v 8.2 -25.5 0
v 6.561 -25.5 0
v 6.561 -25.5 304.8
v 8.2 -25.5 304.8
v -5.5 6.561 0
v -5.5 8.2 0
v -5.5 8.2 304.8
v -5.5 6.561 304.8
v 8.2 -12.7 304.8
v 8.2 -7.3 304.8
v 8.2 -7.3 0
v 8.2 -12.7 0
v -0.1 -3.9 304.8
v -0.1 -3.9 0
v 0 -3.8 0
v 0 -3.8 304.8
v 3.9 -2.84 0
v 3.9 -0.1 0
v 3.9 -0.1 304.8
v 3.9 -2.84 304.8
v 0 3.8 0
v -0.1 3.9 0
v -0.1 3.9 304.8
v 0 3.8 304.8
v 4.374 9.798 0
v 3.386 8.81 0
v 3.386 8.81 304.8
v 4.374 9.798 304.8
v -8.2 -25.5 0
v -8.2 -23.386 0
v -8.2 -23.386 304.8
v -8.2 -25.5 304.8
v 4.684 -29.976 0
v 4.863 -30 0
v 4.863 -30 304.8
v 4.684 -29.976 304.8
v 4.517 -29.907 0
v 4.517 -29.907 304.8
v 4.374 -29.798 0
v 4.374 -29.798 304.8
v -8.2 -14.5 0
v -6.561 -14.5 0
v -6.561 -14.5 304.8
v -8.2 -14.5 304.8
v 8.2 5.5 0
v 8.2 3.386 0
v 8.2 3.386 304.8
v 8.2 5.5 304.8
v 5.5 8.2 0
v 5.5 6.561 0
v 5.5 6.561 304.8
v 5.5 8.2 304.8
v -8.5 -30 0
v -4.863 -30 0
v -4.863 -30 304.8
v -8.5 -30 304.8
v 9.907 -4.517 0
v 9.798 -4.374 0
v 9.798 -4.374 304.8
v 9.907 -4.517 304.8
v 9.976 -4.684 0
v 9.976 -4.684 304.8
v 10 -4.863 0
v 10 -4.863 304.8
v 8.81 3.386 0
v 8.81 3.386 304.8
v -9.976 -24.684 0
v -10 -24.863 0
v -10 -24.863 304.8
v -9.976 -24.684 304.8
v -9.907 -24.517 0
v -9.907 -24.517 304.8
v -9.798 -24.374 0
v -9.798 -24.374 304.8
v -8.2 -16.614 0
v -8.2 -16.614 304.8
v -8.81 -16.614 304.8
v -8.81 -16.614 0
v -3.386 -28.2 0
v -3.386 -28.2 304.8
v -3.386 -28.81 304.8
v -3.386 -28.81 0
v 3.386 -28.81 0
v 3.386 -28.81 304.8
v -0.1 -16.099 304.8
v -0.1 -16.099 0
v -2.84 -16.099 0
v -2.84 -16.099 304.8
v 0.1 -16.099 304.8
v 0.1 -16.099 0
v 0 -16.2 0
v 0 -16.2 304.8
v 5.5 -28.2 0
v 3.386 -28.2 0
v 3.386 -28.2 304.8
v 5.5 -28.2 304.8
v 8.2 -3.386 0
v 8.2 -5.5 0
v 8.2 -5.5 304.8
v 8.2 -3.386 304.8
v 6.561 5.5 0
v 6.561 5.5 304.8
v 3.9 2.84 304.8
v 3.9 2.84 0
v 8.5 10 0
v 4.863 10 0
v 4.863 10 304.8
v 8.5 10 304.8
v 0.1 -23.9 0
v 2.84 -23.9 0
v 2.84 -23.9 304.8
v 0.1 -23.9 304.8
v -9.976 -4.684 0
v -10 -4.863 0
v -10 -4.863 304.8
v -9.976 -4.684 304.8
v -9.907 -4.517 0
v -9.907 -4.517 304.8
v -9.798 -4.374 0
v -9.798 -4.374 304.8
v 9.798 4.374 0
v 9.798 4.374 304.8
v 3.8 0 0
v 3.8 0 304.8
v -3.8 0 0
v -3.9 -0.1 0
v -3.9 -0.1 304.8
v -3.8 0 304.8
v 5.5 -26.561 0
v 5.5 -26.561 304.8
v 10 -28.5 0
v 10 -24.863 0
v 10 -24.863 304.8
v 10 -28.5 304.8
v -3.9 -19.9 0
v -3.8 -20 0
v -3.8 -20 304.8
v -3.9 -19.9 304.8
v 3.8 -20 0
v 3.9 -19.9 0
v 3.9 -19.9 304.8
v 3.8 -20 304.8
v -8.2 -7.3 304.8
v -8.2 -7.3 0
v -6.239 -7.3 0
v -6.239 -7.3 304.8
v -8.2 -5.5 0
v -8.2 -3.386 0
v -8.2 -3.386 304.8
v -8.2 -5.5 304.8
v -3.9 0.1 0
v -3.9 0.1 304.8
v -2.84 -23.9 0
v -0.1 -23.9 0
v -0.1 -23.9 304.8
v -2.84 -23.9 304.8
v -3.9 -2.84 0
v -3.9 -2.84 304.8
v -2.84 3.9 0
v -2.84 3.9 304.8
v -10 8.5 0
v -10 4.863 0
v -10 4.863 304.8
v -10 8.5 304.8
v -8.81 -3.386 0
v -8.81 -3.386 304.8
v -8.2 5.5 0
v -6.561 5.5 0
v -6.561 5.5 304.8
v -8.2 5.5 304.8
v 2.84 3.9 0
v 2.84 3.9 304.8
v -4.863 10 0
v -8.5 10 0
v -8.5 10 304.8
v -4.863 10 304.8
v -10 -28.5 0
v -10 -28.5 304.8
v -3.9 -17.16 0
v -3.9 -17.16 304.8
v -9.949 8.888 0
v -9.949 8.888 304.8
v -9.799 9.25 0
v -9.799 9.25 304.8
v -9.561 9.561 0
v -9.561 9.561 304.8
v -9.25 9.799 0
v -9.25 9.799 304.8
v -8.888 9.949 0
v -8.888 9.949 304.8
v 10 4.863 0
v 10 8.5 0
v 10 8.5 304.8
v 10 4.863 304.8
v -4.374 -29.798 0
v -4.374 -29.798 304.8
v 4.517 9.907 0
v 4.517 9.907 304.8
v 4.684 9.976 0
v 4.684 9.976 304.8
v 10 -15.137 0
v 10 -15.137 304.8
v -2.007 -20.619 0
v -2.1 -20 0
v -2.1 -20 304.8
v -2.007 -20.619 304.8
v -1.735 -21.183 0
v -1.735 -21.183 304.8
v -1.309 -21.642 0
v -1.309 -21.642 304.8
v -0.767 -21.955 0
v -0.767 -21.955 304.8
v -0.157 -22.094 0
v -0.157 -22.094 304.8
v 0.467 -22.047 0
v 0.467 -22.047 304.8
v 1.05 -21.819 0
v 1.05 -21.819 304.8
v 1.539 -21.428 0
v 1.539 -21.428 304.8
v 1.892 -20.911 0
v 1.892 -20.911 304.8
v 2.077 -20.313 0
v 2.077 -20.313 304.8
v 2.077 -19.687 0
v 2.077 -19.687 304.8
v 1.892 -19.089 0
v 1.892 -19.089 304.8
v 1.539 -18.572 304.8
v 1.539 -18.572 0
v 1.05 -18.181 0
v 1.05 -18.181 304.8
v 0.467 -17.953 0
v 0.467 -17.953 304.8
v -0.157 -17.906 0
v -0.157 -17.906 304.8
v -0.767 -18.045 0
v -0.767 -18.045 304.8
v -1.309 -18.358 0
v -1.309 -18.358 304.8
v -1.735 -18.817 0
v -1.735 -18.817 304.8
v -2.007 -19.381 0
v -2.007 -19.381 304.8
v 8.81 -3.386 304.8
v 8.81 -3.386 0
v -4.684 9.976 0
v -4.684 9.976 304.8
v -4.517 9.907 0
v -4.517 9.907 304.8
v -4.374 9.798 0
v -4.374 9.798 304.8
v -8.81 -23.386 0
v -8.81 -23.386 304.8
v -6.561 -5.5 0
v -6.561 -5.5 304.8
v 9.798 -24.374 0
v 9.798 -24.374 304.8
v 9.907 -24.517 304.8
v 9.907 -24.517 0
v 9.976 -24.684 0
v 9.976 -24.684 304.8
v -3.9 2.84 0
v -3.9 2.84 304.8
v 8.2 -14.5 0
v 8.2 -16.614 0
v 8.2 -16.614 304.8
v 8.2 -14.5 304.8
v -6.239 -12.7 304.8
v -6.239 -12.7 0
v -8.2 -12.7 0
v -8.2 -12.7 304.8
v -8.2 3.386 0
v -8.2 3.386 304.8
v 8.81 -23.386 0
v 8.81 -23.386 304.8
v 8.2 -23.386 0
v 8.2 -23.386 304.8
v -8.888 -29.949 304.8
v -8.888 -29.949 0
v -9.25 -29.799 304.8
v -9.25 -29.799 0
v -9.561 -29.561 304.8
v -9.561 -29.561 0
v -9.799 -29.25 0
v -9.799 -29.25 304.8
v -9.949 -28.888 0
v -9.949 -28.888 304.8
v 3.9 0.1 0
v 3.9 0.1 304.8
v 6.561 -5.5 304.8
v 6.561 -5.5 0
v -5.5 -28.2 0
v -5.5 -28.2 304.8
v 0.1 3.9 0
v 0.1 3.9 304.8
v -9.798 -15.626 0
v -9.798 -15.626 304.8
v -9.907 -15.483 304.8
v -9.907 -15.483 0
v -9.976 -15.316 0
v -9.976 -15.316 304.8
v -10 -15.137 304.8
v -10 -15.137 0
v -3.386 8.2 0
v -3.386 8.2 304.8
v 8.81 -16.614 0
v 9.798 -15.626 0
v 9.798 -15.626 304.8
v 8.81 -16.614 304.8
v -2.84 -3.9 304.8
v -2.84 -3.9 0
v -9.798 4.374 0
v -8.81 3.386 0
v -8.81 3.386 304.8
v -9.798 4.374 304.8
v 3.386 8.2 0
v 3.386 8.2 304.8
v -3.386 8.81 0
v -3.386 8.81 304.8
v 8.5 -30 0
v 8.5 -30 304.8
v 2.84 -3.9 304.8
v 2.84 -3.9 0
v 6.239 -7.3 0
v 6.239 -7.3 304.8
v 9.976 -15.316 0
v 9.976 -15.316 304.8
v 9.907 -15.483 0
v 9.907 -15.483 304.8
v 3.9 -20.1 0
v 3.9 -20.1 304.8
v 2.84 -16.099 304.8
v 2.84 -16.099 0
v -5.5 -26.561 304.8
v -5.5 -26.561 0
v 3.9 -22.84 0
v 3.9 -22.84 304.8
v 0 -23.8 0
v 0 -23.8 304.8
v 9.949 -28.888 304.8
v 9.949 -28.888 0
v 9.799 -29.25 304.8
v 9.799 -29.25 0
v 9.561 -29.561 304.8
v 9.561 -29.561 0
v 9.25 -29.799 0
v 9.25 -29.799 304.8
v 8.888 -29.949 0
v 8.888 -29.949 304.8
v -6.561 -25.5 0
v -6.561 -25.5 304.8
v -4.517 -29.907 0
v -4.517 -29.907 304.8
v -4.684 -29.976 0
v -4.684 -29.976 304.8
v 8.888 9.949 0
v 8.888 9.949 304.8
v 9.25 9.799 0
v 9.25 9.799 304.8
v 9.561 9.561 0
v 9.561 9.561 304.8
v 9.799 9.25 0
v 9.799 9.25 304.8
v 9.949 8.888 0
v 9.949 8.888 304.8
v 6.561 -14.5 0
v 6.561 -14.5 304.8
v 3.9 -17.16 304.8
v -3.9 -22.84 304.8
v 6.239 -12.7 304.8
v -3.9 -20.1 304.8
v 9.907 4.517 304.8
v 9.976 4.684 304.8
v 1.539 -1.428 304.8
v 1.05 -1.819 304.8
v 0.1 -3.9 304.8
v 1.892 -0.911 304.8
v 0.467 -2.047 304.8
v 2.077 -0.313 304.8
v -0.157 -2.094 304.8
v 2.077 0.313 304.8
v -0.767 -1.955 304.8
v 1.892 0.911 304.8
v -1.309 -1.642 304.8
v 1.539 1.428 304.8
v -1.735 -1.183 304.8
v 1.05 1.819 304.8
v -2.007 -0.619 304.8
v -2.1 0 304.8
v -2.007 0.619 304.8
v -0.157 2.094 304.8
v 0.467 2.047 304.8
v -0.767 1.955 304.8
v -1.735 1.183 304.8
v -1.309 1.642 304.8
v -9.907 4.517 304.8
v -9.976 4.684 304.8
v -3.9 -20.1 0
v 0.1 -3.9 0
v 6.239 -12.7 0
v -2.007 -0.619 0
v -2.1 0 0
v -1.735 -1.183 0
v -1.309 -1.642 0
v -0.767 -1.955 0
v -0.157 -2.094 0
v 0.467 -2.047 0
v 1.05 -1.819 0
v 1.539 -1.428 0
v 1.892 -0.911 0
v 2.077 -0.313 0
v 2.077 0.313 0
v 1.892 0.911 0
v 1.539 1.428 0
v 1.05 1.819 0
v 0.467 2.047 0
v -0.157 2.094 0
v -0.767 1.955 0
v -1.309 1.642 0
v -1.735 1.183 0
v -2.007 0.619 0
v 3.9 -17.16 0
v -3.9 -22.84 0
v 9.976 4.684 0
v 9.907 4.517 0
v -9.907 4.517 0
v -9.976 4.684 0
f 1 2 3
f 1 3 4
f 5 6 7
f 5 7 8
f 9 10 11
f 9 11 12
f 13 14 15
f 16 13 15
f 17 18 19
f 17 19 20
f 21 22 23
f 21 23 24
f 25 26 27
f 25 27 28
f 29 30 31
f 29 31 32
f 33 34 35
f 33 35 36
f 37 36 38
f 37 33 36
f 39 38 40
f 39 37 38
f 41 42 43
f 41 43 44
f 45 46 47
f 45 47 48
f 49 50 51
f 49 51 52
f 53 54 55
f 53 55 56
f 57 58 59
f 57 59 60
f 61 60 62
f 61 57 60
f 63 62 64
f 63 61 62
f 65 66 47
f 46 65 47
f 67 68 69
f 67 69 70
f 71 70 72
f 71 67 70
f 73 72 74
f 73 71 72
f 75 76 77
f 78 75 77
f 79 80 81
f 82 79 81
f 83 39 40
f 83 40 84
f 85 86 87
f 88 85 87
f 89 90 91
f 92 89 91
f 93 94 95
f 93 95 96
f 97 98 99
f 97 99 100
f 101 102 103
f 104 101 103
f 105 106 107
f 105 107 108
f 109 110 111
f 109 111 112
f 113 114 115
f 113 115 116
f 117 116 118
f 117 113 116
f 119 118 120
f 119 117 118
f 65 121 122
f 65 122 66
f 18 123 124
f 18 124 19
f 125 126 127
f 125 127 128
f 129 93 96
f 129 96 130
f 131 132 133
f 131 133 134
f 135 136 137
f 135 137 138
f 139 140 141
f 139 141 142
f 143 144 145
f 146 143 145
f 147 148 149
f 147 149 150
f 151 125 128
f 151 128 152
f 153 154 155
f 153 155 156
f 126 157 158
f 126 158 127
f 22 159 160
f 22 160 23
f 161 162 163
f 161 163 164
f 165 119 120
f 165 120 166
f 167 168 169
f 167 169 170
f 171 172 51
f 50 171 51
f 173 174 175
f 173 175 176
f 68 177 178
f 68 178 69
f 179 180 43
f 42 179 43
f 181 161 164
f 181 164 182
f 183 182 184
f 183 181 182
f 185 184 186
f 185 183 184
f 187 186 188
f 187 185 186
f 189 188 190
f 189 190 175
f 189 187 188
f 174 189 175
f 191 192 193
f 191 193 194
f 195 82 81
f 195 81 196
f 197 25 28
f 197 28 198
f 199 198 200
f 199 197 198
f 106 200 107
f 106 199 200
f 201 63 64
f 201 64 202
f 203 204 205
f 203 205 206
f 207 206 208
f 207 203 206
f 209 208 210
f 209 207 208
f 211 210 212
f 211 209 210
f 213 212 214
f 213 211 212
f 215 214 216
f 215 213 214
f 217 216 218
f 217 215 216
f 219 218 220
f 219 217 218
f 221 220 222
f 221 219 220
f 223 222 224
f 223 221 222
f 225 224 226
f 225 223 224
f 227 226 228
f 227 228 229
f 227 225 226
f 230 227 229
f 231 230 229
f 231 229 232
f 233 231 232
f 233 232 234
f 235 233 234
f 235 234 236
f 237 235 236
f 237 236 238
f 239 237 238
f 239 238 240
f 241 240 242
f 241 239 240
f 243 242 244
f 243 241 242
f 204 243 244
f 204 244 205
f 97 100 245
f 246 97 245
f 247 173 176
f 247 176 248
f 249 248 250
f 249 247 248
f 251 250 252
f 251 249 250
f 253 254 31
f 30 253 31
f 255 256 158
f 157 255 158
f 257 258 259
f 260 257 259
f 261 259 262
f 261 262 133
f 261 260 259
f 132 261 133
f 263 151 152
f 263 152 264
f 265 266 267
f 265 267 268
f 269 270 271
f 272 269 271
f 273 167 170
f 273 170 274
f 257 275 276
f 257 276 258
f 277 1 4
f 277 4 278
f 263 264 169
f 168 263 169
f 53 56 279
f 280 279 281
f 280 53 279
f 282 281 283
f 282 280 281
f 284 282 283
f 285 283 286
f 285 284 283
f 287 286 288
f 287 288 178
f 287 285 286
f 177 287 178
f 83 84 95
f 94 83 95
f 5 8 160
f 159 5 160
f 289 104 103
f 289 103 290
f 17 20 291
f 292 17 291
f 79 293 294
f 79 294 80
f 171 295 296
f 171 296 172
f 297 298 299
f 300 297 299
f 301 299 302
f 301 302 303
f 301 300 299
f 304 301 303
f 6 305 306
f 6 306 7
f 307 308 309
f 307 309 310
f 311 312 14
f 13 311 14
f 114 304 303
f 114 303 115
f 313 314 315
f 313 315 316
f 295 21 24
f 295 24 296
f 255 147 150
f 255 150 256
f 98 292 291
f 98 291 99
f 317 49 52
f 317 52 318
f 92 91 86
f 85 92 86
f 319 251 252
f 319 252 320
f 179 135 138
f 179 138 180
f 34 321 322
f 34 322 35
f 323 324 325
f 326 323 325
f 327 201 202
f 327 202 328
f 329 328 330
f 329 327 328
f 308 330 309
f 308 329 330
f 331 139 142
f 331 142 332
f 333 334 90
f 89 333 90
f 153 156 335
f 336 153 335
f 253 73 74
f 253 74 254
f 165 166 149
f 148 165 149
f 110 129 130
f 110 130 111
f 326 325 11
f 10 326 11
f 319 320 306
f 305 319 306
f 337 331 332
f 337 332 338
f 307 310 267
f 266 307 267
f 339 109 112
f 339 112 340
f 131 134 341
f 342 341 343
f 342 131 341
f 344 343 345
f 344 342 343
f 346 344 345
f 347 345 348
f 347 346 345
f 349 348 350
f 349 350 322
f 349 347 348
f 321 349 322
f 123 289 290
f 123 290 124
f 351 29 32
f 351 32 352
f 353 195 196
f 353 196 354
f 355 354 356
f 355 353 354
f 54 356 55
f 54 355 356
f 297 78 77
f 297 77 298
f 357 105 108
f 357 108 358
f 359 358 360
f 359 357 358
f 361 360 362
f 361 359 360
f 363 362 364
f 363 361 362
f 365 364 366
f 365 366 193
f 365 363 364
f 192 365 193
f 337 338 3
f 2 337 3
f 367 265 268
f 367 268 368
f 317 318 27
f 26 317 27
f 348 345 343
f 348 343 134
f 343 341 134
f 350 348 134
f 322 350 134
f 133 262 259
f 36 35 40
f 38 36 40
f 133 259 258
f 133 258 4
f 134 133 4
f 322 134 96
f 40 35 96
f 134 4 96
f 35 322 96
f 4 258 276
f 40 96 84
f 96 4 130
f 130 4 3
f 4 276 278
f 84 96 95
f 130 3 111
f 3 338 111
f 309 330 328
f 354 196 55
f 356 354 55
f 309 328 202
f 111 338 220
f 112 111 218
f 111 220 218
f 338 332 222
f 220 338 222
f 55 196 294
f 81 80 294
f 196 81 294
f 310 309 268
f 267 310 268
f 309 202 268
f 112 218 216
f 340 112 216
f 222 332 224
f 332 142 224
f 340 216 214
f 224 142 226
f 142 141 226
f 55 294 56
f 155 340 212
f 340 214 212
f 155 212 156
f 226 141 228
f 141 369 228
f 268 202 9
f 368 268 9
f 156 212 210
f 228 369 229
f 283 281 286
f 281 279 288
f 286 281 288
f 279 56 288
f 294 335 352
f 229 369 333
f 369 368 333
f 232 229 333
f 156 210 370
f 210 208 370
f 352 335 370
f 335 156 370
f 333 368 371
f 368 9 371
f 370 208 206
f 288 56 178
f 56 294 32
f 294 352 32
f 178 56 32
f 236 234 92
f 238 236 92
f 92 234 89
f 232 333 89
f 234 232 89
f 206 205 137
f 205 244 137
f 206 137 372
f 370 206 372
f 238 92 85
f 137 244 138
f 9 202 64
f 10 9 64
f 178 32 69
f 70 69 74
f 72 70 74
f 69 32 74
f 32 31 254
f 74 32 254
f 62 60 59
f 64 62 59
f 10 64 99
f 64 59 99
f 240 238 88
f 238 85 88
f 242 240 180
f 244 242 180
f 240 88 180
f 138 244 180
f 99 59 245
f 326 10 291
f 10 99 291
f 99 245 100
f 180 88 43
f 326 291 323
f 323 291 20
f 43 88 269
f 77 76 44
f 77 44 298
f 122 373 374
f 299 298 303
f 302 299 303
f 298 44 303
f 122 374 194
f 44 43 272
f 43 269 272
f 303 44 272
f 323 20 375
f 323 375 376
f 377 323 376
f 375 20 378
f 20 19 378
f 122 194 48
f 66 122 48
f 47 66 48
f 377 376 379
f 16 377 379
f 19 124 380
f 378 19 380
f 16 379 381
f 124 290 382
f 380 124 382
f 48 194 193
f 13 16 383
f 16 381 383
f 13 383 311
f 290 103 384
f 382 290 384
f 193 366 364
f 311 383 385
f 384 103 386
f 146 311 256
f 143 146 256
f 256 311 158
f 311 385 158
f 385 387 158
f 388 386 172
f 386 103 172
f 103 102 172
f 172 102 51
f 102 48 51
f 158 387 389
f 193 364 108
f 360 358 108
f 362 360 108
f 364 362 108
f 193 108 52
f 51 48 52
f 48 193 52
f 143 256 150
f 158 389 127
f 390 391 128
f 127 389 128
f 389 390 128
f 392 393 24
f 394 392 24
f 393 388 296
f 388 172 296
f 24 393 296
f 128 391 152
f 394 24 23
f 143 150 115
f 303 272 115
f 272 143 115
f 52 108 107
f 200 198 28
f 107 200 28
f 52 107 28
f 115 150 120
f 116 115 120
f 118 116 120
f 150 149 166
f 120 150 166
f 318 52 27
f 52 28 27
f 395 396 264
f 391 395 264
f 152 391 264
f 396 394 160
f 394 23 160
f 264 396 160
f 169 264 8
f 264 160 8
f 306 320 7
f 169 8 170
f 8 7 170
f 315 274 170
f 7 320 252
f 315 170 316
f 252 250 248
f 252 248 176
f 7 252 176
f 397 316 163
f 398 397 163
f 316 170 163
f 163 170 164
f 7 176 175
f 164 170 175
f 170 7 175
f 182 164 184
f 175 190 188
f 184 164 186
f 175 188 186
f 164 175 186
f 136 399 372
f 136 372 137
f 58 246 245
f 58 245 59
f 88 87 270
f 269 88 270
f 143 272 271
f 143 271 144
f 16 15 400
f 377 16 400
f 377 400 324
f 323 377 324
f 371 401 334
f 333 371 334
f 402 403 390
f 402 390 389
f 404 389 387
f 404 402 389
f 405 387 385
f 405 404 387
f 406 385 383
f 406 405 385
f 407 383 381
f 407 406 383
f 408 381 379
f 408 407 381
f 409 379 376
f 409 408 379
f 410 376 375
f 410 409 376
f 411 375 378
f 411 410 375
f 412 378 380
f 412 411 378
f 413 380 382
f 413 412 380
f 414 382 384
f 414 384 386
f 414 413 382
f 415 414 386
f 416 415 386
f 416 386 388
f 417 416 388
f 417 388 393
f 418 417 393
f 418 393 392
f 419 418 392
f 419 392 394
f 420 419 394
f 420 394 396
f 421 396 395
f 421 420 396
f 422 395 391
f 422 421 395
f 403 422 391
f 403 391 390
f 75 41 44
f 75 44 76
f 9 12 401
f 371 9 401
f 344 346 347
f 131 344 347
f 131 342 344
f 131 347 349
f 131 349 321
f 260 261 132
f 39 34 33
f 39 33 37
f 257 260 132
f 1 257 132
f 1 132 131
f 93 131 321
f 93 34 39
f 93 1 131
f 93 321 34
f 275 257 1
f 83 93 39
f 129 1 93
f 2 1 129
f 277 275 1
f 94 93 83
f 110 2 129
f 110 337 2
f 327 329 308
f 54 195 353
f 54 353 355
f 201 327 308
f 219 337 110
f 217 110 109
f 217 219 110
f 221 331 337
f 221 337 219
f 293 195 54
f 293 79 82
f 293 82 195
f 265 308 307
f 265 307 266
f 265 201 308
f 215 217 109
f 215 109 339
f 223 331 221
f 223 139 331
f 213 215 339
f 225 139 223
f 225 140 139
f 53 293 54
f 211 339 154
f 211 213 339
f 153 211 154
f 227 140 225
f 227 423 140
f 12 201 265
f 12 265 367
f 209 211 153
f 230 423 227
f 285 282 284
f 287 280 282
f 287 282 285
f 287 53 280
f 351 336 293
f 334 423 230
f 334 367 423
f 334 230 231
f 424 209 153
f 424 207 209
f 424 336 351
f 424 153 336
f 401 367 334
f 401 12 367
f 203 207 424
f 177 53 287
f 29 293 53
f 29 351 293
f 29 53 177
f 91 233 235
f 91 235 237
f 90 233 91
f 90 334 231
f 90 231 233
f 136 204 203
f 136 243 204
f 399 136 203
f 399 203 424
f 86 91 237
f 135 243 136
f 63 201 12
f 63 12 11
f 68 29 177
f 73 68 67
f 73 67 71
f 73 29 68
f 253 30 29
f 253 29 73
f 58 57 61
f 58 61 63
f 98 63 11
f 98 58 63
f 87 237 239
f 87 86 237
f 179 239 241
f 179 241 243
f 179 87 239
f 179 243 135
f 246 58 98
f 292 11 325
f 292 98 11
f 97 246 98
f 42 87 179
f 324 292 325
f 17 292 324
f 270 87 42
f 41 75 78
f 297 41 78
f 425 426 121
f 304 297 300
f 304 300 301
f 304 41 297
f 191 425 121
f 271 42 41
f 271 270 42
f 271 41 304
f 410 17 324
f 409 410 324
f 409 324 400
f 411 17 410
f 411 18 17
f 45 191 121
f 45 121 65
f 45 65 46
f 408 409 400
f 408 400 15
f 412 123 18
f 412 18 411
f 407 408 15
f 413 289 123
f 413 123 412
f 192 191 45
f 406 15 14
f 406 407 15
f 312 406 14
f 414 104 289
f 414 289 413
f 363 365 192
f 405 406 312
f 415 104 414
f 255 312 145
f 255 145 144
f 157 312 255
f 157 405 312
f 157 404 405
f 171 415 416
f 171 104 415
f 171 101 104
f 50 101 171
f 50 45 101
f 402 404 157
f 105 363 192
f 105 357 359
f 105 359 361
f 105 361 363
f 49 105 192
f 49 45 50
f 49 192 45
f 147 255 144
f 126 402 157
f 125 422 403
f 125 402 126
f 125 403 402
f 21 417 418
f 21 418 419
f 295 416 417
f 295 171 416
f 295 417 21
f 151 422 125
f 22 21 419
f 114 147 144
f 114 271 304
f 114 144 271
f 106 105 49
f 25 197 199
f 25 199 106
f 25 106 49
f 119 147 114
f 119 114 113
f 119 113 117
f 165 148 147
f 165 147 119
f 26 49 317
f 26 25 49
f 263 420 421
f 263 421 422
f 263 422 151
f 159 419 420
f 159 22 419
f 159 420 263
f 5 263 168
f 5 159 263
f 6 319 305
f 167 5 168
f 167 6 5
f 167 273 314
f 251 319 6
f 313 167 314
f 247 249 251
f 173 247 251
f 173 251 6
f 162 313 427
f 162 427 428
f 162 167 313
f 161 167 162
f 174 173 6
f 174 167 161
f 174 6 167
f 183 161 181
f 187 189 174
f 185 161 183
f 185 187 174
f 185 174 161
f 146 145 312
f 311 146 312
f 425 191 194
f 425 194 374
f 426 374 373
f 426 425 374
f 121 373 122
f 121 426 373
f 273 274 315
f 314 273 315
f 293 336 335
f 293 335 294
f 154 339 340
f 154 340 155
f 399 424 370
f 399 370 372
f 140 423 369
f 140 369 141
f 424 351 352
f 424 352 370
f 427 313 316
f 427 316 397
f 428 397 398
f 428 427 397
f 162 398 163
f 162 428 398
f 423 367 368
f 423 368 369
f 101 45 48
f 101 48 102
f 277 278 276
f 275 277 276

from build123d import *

# Parameters (mm, degrees)
SKETCH1_R           = 2.1
BOSS_EXTRUDE2_DEPTH = 304.8


with BuildPart() as part:
    # Sketch1 → Boss-Extrude2 (new body)
    with BuildSketch(Plane.XY):
        with BuildLine():
            Line((-8.5, 10), (-4.862792737, 10))
            ThreePointArc((-4.862792737, 10), (-4.598292737, 9.947387679), (-4.374060464, 9.797560464))
            Line((-4.374060464, 9.797560464), (-3.3865, 8.81))
            Line((-3.3865, 8.81), (-3.3865, 8.2))
            Line((-3.3865, 8.2), (-5.5, 8.2))
            Line((-5.5, 8.2), (-5.5, 6.561))
            Line((-5.5, 6.561), (-2.8395, 3.9005))
            Line((-2.8395, 3.9005), (-0.1, 3.9005))
            Line((-0.1, 3.9005), (0, 3.8005))
            Line((0, 3.8005), (0.1, 3.9005))
            Line((0.1, 3.9005), (2.8395, 3.9005))
            Line((2.8395, 3.9005), (5.5, 6.561))
            Line((5.5, 6.561), (5.5, 8.2))
            Line((5.5, 8.2), (3.3865, 8.2))
            Line((3.3865, 8.2), (3.3865, 8.81))
            Line((3.3865, 8.81), (4.374060464, 9.797560464))
            ThreePointArc((4.374060464, 9.797560464), (4.598292737, 9.947387679), (4.862792737, 10))
            Line((4.862792737, 10), (8.5, 10))
            ThreePointArc((8.5, 10), (9.560660172, 9.560660172), (10, 8.5))
            Line((10, 8.5), (10, 4.862792737))
            ThreePointArc((10, 4.862792737), (9.947387679, 4.598292737), (9.797560464, 4.374060464))
            Line((9.797560464, 4.374060464), (8.81, 3.3865))
            Line((8.81, 3.3865), (8.2, 3.3865))
            Line((8.2, 3.3865), (8.2, 5.5))
            Line((8.2, 5.5), (6.561, 5.5))
            Line((6.561, 5.5), (3.9005, 2.8395))
            Line((3.9005, 2.8395), (3.9005, 0.1))
            Line((3.9005, 0.1), (3.8005, 0))
            Line((3.8005, 0), (3.9005, -0.1))
            Line((3.9005, -0.1), (3.9005, -2.8395))
            Line((3.9005, -2.8395), (6.561, -5.5))
            Line((6.561, -5.5), (8.2, -5.5))
            Line((8.2, -5.5), (8.2, -3.3865))
            Line((8.2, -3.3865), (8.81, -3.3865))
            Line((8.81, -3.3865), (9.797560464, -4.374060464))
            ThreePointArc((9.797560464, -4.374060464), (9.947387679, -4.598292737), (10, -4.862792737))
            Line((10, -4.862792737), (10, -15.137207263))
            ThreePointArc((10, -15.137207263), (9.947387679, -15.401707263), (9.797560464, -15.625939536))
            Line((9.797560464, -15.625939536), (8.81, -16.6135))
            Line((8.81, -16.6135), (8.2, -16.6135))
            Line((8.2, -16.6135), (8.2, -14.5))
            Line((8.2, -14.5), (6.561, -14.5))
            Line((6.561, -14.5), (3.9005, -17.1605))
            Line((3.9005, -17.1605), (3.9005, -19.9))
            Line((3.9005, -19.9), (3.8005, -20))
            Line((3.8005, -20), (3.9005, -20.1))
            Line((3.9005, -20.1), (3.9005, -22.8395))
            Line((3.9005, -22.8395), (6.561, -25.5))
            Line((6.561, -25.5), (8.2, -25.5))
            Line((8.2, -25.5), (8.2, -23.3865))
            Line((8.2, -23.3865), (8.81, -23.3865))
            Line((8.81, -23.3865), (9.797560464, -24.374060464))
            ThreePointArc((9.797560464, -24.374060464), (9.947387679, -24.598292737), (10, -24.862792737))
            Line((10, -24.862792737), (10, -28.5))
            ThreePointArc((10, -28.5), (9.560660172, -29.560660172), (8.5, -30))
            Line((8.5, -30), (4.862792737, -30))
            ThreePointArc((4.862792737, -30), (4.598292737, -29.947387679), (4.374060464, -29.797560464))
            Line((4.374060464, -29.797560464), (3.3865, -28.81))
            Line((3.3865, -28.81), (3.3865, -28.2))
            Line((3.3865, -28.2), (5.5, -28.2))
            Line((5.5, -28.2), (5.5, -26.561))
            Line((5.5, -26.561), (2.8395, -23.9005))
            Line((2.8395, -23.9005), (0.1, -23.9005))
            Line((0.1, -23.9005), (0, -23.8005))
            Line((0, -23.8005), (-0.1, -23.9005))
            Line((-0.1, -23.9005), (-2.8395, -23.9005))
            Line((-2.8395, -23.9005), (-5.5, -26.561))
            Line((-5.5, -26.561), (-5.5, -28.2))
            Line((-5.5, -28.2), (-3.3865, -28.2))
            Line((-3.3865, -28.2), (-3.3865, -28.81))
            Line((-3.3865, -28.81), (-4.374060464, -29.797560464))
            ThreePointArc((-4.374060464, -29.797560464), (-4.598292737, -29.947387679), (-4.862792737, -30))
            Line((-4.862792737, -30), (-8.5, -30))
            ThreePointArc((-8.5, -30), (-9.560660172, -29.560660172), (-10, -28.5))
            Line((-10, -28.5), (-10, -24.862792737))
            ThreePointArc((-10, -24.862792737), (-9.947387679, -24.598292737), (-9.797560464, -24.374060464))
            Line((-9.797560464, -24.374060464), (-8.81, -23.3865))
            Line((-8.81, -23.3865), (-8.2, -23.3865))
            Line((-8.2, -23.3865), (-8.2, -25.5))
            Line((-8.2, -25.5), (-6.561, -25.5))
            Line((-6.561, -25.5), (-3.9005, -22.8395))
            Line((-3.9005, -22.8395), (-3.9005, -20.1))
            Line((-3.9005, -20.1), (-3.8005, -20))
            Line((-3.8005, -20), (-3.9005, -19.9))
            Line((-3.9005, -19.9), (-3.9005, -17.1605))
            Line((-3.9005, -17.1605), (-6.561, -14.5))
            Line((-6.561, -14.5), (-8.2, -14.5))
            Line((-8.2, -14.5), (-8.2, -16.6135))
            Line((-8.2, -16.6135), (-8.81, -16.6135))
            Line((-8.81, -16.6135), (-9.797560464, -15.625939536))
            ThreePointArc((-9.797560464, -15.625939536), (-9.947387679, -15.401707263), (-10, -15.137207263))
            Line((-10, -15.137207263), (-10, -4.862792737))
            ThreePointArc((-10, -4.862792737), (-9.947387679, -4.598292737), (-9.797560464, -4.374060464))
            Line((-9.797560464, -4.374060464), (-8.81, -3.3865))
            Line((-8.81, -3.3865), (-8.2, -3.3865))
            Line((-8.2, -3.3865), (-8.2, -5.5))
            Line((-8.2, -5.5), (-6.561, -5.5))
            Line((-6.561, -5.5), (-3.9005, -2.8395))
            Line((-3.9005, -2.8395), (-3.9005, -0.1))
            Line((-3.9005, -0.1), (-3.8005, 0))
            Line((-3.8005, 0), (-3.9005, 0.1))
            Line((-3.9005, 0.1), (-3.9005, 2.8395))
            Line((-3.9005, 2.8395), (-6.561, 5.5))
            Line((-6.561, 5.5), (-8.2, 5.5))
            Line((-8.2, 5.5), (-8.2, 3.3865))
            Line((-8.2, 3.3865), (-8.81, 3.3865))
            Line((-8.81, 3.3865), (-9.797560464, 4.374060464))
            ThreePointArc((-9.797560464, 4.374060464), (-9.947387679, 4.598292737), (-10, 4.862792737))
            Line((-10, 4.862792737), (-10, 8.5))
            ThreePointArc((-10, 8.5), (-9.560660172, 9.560660172), (-8.5, 10))
        make_face()
        with Locations(Location((0, 0, 0), (0, 0, 180))):
            Circle(SKETCH1_R, mode=Mode.SUBTRACT)
        with Locations(Location((0, -20, 0), (0, 0, 180))):
            Circle(SKETCH1_R, mode=Mode.SUBTRACT)
        Polygon((-8.2, -12.7), (-8.2, -7.3), (-6.239, -7.3), (-5.5, -6.561), (-2.8395, -3.9005), (-0.1, -3.9005), (0, -3.8005), (0.1, -3.9005), (2.8395, -3.9005), (5.5, -6.561), (6.239, -7.3), (8.2, -7.3), (8.2, -12.7), (6.239, -12.7), (5.5, -13.439), (2.8395, -16.0995), (0.1, -16.0995), (0, -16.1995), (-0.1, -16.0995), (-2.8395, -16.0995), (-5.5, -13.439), (-6.239, -12.7), align=None, mode=Mode.SUBTRACT)
    extrude(amount=BOSS_EXTRUDE2_DEPTH)


solid = part.part
